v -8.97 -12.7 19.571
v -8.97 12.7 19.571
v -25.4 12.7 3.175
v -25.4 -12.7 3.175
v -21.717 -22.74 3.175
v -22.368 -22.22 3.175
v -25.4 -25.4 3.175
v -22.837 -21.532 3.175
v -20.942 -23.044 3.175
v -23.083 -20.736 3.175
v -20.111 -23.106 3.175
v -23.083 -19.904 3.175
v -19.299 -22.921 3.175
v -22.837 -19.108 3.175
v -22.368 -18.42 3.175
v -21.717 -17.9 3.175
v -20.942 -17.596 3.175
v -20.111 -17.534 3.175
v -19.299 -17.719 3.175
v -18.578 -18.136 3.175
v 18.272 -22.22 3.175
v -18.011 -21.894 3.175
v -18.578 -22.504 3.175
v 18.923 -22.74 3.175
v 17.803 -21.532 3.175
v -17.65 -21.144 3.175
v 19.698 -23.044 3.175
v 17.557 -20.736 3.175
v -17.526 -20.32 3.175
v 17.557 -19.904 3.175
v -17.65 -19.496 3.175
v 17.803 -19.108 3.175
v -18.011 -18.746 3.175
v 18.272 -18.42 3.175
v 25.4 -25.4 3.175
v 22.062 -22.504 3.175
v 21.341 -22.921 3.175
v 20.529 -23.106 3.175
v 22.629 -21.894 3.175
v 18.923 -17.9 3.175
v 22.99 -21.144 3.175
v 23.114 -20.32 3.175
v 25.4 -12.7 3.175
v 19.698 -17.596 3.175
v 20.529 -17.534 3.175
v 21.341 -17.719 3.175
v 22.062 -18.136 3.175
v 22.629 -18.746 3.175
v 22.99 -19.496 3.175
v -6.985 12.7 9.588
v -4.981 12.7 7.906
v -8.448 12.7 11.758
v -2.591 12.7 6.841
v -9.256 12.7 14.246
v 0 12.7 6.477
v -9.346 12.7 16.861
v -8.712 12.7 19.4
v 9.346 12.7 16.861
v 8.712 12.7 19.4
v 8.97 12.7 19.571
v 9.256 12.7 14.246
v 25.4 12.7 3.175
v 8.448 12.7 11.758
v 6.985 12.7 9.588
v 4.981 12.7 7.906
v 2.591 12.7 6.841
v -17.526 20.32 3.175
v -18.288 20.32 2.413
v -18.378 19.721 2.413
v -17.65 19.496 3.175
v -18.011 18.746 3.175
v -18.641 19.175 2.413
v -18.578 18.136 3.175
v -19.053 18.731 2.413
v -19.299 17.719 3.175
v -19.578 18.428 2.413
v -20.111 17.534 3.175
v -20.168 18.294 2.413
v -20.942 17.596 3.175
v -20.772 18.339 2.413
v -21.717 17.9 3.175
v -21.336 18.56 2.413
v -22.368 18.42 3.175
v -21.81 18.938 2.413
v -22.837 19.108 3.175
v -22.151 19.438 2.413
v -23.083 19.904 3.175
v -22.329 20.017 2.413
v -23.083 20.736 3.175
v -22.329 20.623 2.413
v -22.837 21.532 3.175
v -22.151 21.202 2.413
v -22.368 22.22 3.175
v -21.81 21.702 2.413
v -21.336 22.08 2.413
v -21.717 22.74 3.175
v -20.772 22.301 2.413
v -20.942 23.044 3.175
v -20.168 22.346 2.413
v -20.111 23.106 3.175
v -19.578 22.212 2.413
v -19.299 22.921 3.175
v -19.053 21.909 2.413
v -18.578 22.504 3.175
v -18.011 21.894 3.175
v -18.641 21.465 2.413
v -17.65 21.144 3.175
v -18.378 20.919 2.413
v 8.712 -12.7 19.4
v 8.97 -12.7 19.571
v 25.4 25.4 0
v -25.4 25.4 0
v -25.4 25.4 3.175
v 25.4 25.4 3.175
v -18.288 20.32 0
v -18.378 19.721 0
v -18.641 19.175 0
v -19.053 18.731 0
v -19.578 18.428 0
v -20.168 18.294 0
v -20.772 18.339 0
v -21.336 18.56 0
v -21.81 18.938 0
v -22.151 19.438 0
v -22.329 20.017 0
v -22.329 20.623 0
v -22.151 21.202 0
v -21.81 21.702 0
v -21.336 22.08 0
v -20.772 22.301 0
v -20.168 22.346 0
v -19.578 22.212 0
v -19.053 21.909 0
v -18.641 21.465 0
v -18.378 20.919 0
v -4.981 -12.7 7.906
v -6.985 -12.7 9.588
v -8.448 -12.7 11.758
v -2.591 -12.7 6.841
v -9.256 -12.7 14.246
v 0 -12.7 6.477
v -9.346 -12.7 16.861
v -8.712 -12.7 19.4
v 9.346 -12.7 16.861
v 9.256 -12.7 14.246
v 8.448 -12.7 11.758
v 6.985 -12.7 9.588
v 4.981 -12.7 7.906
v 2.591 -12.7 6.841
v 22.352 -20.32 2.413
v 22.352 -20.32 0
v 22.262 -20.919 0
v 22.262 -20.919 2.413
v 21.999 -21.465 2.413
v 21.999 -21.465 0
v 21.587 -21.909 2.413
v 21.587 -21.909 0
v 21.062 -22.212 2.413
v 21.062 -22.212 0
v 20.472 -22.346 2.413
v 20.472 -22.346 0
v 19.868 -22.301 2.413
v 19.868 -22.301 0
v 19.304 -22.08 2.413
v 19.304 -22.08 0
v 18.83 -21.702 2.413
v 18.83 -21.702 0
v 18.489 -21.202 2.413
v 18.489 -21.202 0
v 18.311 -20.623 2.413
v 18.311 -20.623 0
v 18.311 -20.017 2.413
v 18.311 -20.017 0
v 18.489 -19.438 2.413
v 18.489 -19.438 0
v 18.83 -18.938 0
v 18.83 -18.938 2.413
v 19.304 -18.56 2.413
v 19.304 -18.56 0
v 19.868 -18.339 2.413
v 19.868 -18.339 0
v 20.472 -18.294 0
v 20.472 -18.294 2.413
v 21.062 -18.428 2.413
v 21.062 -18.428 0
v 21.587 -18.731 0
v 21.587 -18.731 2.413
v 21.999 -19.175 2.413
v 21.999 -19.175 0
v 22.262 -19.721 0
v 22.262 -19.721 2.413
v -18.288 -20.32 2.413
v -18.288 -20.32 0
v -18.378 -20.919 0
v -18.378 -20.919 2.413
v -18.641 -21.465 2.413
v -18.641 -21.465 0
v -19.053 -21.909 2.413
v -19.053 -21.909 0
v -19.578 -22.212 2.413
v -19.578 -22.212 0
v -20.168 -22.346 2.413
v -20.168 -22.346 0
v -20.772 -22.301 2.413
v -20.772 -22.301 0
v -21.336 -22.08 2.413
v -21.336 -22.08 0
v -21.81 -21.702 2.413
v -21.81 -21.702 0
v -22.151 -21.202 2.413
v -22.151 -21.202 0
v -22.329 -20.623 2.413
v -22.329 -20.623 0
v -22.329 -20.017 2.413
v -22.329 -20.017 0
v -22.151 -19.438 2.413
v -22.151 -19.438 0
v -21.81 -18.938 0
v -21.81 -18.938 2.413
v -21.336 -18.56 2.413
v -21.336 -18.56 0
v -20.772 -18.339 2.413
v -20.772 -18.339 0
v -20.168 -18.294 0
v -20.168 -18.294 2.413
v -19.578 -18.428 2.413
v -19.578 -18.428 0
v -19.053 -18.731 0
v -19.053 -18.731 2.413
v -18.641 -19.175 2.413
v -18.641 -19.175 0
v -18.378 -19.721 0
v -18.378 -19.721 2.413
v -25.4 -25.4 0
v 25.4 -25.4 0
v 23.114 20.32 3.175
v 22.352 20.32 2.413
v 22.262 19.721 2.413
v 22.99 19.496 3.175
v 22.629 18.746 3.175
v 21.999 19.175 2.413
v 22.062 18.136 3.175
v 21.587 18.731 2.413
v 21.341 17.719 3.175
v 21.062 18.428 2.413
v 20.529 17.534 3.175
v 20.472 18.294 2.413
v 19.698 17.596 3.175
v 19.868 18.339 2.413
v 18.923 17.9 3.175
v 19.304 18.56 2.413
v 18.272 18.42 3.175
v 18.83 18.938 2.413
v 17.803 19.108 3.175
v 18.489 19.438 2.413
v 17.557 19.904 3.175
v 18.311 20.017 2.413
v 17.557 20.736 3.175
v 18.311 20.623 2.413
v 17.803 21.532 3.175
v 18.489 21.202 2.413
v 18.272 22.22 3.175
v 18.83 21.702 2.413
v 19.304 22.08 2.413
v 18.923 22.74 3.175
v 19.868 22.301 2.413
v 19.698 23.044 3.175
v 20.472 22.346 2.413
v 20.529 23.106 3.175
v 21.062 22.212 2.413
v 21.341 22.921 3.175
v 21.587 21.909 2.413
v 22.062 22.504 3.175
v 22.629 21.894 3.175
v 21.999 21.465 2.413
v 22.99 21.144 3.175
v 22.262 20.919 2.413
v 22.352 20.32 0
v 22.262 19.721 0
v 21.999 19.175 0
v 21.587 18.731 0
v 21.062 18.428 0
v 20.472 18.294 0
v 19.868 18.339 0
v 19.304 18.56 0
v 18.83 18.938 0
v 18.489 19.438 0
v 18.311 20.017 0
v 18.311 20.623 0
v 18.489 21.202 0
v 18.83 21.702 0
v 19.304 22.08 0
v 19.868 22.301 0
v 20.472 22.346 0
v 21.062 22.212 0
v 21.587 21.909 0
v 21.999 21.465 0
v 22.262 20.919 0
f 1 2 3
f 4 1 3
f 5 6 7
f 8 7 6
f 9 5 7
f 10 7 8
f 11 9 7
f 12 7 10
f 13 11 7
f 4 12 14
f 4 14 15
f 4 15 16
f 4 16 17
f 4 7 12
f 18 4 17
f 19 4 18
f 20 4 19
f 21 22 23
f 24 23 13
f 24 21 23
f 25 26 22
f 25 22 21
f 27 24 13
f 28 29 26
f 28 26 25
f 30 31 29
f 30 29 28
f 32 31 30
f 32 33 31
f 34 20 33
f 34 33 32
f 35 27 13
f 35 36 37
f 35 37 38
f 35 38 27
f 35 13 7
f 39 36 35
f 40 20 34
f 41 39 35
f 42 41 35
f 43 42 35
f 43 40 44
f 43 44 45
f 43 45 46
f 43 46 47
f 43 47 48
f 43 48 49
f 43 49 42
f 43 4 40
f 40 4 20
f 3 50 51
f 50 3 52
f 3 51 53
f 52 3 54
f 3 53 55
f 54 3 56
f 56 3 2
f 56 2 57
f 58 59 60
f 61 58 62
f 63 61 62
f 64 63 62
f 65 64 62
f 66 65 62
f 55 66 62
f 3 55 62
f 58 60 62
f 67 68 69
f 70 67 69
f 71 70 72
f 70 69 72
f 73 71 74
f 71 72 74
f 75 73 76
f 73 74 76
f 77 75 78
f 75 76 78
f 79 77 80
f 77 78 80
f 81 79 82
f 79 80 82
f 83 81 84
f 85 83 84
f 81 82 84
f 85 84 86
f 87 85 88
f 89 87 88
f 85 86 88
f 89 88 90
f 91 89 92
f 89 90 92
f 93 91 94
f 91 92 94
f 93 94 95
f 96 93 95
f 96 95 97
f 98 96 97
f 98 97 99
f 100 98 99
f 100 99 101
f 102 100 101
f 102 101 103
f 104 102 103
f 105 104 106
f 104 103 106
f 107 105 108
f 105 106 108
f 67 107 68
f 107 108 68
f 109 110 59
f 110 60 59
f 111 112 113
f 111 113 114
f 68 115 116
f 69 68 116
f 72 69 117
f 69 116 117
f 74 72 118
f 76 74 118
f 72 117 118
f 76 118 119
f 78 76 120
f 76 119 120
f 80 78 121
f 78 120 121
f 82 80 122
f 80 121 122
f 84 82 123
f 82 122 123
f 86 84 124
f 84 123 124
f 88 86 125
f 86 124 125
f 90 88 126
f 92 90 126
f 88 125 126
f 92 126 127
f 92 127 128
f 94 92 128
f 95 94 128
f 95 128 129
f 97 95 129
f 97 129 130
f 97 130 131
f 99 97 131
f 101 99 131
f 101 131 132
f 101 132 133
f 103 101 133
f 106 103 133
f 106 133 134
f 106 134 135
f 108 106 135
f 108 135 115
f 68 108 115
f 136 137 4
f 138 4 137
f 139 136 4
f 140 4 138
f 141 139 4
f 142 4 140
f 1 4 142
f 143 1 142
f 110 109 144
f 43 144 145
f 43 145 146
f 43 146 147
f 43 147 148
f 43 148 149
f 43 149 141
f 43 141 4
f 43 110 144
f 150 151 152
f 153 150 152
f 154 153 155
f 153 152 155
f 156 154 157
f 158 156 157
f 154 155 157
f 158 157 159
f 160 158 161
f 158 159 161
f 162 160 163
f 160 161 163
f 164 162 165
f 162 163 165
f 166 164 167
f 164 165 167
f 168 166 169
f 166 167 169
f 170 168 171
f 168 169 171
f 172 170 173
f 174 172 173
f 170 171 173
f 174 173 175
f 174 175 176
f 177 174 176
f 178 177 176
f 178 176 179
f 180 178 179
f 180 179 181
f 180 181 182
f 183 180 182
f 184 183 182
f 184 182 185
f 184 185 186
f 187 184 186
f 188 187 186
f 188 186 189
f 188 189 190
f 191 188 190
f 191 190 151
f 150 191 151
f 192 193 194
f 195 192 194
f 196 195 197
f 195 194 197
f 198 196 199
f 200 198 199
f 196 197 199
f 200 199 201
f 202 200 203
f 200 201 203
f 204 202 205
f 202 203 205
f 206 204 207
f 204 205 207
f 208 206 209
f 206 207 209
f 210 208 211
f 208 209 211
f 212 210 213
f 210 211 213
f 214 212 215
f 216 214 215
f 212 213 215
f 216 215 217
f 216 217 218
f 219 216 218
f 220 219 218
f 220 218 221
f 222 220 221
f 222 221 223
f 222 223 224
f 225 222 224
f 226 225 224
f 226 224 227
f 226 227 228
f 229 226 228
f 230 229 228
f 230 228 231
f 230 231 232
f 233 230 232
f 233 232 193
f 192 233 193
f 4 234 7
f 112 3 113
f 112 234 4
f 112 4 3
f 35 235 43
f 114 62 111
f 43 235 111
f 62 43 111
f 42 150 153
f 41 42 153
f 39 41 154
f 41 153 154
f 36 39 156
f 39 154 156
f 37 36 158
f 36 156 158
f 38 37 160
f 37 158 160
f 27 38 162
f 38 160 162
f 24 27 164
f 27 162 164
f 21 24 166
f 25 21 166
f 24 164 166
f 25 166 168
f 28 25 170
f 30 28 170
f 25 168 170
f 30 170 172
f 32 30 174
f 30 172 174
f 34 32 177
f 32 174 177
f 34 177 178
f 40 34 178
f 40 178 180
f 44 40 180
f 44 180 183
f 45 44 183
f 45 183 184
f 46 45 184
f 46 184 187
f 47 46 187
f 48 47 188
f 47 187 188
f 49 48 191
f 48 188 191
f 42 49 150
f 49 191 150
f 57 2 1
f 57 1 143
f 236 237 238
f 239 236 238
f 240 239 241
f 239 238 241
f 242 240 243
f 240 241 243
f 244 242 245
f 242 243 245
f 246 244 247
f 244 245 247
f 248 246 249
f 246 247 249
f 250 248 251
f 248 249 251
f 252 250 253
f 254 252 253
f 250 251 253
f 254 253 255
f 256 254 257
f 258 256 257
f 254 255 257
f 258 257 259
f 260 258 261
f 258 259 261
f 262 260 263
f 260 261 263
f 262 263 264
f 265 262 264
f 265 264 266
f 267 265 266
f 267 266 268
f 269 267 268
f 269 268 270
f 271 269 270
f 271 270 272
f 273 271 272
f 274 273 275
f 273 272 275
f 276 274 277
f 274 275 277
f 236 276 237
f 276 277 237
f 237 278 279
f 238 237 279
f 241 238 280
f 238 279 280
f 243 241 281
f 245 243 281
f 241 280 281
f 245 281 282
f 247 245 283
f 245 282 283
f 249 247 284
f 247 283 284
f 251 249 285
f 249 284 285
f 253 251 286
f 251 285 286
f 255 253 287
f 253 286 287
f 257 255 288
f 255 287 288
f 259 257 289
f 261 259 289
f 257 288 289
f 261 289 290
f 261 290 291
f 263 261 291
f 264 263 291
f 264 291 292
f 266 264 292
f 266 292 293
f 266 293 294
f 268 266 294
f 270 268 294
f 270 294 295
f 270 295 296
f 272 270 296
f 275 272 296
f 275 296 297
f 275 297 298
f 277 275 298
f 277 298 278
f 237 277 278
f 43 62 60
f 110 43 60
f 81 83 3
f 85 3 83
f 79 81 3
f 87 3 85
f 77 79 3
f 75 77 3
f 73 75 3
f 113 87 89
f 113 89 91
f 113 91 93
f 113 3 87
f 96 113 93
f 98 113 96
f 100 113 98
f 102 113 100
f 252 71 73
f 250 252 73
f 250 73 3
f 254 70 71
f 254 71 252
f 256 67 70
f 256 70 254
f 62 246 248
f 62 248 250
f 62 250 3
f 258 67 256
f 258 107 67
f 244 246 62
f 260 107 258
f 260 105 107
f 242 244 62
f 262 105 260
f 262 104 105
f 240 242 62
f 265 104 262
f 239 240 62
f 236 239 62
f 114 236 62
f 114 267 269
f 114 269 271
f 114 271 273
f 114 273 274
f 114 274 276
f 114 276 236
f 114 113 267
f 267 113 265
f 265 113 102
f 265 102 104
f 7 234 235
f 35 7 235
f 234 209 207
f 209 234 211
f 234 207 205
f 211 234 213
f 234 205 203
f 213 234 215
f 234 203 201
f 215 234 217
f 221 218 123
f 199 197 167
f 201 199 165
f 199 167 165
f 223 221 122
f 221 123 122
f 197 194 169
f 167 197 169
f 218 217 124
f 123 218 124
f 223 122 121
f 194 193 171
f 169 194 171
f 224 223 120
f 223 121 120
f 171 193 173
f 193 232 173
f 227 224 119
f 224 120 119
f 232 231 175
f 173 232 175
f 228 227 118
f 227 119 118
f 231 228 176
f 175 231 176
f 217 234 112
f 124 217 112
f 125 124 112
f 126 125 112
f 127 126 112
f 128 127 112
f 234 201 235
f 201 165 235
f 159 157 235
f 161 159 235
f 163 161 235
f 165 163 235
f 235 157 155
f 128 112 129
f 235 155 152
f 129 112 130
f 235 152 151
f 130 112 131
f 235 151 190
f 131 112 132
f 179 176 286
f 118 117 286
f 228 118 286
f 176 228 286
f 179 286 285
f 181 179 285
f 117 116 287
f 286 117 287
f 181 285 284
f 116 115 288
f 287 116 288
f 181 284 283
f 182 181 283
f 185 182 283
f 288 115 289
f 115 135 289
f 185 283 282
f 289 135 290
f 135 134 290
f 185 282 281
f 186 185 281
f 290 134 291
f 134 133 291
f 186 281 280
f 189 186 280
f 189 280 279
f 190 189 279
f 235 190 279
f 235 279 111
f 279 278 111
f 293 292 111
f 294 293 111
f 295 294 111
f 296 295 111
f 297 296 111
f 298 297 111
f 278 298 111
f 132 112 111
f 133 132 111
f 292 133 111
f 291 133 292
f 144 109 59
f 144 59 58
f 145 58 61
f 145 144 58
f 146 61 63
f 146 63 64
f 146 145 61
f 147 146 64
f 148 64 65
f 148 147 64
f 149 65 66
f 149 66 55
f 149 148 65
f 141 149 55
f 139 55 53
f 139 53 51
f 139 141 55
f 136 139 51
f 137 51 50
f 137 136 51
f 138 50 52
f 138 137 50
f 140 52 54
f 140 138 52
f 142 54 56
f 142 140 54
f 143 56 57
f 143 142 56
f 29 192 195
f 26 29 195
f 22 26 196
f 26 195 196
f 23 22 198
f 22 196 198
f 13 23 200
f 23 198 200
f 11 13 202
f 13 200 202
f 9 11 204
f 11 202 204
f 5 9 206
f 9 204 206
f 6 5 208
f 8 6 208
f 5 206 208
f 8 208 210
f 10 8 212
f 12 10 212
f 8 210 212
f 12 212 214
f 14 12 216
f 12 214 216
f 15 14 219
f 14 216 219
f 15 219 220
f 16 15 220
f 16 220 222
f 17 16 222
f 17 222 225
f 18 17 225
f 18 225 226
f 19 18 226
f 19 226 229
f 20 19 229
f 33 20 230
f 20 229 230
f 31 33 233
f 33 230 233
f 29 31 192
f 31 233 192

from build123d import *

# Parameters (mm, degrees)
F0_W        = 50.8
F0_H        = 50.8
F1_DEPTH    = 3.175
F3_DEPTH    = 12.7
F4_T1_DEPTH = 29.8470625703
F5_R        = 2.032
F6_DEPTH    = 25.4
F7_SIZE     = 0.762


# Not quite as in the source:
# - a fillet or chamfer that OpenCascade refuses, or shapes differently, is made with other operations: its cross-section is extruded or revolved along the edge and cut away or added


with BuildPart() as f1:
    # F0 (on Top) → F1 (new body)
    with BuildSketch(Plane.XY):
        Rectangle(F0_W, F0_H)
    extrude(amount=F1_DEPTH)

    # F2 (on Front) → F3 (join, symmetric)
    with BuildSketch(Plane.XZ):
        with BuildLine():
            ThreePointArc((8.3472917764, 20.193), (0, 6.477), (-8.3472917764, 20.193))
            Line((-8.3472917764, 20.193), (-25.4, 3.175))
            Line((-25.4, 3.175), (25.4, 3.175))
            Line((25.4, 3.175), (8.3472917764, 20.193))
        make_face()
    extrude(amount=F3_DEPTH, both=True)

    # F4: chamfer of 1.016 on 2 edges, made by hand

    # F4_s2 → F4_t1 (cut)
    with BuildSketch(Plane.XZ.offset(-14.9235312851)):
        with BuildLine():
            Line((-9.00434009, 19.5935484726), (-8.6781133788, 19.3772721718))
            Line((-8.6781133788, 19.3772721718), (-8.659276653, 19.3696511377))
            ThreePointArc((-8.659276653, 19.3696511377), (-8.5217005097, 19.7892691023), (-8.3292435779, 20.1836637838))
            Line((-8.3292435779, 20.1836637838), (-8.3616455415, 20.2073830396))
            ThreePointArc((-8.3616455415, 20.2073830396), (-8.6761048617, 19.893563754), (-9.0186938551, 19.6079315122))
            Line((-9.0186938551, 19.6079315122), (-9.00434009, 19.5935484726))
        make_face()
        with BuildLine():
            Line((9.00434009, 19.5935484726), (8.6781133788, 19.3772721718))
            Line((8.6781133788, 19.3772721718), (8.659276653, 19.3696511377))
            ThreePointArc((8.659276653, 19.3696511377), (8.5217005097, 19.7892691023), (8.3292435779, 20.1836637838))
            Line((8.3292435779, 20.1836637838), (8.3616455415, 20.2073830396))
            ThreePointArc((8.3616455415, 20.2073830396), (8.6761048617, 19.893563754), (9.0186938551, 19.6079315122))
            Line((9.0186938551, 19.6079315122), (9.00434009, 19.5935484726))
        make_face()
    extrude(amount=F4_T1_DEPTH, mode=Mode.SUBTRACT)

    # F5 (on face) → F6 (cut)
    with BuildSketch(Plane(origin=(0, 0, 0), x_dir=(1, 0, 0), z_dir=(0, 0, -1))):
        with Locations((-20.32, 20.32)):
            Circle(F5_R)
        with Locations((-20.32, -20.32)):
            Circle(F5_R)
        with Locations((20.32, 20.32)):
            Circle(F5_R)
        with Locations((20.32, -20.32)):
            Circle(F5_R)
    extrude(amount=-F6_DEPTH, mode=Mode.SUBTRACT)

    # F7
    f7_edges = [f1.edges().sort_by_distance(p)[0] for p in [
        (-22.352, -20.32, 3.175),
        (-22.352, 20.32, 3.175),
        (18.288, 20.32, 3.175),
        (18.288, -20.32, 3.175),
    ]]
    chamfer(f7_edges, length=F7_SIZE)


solid = f1.part
